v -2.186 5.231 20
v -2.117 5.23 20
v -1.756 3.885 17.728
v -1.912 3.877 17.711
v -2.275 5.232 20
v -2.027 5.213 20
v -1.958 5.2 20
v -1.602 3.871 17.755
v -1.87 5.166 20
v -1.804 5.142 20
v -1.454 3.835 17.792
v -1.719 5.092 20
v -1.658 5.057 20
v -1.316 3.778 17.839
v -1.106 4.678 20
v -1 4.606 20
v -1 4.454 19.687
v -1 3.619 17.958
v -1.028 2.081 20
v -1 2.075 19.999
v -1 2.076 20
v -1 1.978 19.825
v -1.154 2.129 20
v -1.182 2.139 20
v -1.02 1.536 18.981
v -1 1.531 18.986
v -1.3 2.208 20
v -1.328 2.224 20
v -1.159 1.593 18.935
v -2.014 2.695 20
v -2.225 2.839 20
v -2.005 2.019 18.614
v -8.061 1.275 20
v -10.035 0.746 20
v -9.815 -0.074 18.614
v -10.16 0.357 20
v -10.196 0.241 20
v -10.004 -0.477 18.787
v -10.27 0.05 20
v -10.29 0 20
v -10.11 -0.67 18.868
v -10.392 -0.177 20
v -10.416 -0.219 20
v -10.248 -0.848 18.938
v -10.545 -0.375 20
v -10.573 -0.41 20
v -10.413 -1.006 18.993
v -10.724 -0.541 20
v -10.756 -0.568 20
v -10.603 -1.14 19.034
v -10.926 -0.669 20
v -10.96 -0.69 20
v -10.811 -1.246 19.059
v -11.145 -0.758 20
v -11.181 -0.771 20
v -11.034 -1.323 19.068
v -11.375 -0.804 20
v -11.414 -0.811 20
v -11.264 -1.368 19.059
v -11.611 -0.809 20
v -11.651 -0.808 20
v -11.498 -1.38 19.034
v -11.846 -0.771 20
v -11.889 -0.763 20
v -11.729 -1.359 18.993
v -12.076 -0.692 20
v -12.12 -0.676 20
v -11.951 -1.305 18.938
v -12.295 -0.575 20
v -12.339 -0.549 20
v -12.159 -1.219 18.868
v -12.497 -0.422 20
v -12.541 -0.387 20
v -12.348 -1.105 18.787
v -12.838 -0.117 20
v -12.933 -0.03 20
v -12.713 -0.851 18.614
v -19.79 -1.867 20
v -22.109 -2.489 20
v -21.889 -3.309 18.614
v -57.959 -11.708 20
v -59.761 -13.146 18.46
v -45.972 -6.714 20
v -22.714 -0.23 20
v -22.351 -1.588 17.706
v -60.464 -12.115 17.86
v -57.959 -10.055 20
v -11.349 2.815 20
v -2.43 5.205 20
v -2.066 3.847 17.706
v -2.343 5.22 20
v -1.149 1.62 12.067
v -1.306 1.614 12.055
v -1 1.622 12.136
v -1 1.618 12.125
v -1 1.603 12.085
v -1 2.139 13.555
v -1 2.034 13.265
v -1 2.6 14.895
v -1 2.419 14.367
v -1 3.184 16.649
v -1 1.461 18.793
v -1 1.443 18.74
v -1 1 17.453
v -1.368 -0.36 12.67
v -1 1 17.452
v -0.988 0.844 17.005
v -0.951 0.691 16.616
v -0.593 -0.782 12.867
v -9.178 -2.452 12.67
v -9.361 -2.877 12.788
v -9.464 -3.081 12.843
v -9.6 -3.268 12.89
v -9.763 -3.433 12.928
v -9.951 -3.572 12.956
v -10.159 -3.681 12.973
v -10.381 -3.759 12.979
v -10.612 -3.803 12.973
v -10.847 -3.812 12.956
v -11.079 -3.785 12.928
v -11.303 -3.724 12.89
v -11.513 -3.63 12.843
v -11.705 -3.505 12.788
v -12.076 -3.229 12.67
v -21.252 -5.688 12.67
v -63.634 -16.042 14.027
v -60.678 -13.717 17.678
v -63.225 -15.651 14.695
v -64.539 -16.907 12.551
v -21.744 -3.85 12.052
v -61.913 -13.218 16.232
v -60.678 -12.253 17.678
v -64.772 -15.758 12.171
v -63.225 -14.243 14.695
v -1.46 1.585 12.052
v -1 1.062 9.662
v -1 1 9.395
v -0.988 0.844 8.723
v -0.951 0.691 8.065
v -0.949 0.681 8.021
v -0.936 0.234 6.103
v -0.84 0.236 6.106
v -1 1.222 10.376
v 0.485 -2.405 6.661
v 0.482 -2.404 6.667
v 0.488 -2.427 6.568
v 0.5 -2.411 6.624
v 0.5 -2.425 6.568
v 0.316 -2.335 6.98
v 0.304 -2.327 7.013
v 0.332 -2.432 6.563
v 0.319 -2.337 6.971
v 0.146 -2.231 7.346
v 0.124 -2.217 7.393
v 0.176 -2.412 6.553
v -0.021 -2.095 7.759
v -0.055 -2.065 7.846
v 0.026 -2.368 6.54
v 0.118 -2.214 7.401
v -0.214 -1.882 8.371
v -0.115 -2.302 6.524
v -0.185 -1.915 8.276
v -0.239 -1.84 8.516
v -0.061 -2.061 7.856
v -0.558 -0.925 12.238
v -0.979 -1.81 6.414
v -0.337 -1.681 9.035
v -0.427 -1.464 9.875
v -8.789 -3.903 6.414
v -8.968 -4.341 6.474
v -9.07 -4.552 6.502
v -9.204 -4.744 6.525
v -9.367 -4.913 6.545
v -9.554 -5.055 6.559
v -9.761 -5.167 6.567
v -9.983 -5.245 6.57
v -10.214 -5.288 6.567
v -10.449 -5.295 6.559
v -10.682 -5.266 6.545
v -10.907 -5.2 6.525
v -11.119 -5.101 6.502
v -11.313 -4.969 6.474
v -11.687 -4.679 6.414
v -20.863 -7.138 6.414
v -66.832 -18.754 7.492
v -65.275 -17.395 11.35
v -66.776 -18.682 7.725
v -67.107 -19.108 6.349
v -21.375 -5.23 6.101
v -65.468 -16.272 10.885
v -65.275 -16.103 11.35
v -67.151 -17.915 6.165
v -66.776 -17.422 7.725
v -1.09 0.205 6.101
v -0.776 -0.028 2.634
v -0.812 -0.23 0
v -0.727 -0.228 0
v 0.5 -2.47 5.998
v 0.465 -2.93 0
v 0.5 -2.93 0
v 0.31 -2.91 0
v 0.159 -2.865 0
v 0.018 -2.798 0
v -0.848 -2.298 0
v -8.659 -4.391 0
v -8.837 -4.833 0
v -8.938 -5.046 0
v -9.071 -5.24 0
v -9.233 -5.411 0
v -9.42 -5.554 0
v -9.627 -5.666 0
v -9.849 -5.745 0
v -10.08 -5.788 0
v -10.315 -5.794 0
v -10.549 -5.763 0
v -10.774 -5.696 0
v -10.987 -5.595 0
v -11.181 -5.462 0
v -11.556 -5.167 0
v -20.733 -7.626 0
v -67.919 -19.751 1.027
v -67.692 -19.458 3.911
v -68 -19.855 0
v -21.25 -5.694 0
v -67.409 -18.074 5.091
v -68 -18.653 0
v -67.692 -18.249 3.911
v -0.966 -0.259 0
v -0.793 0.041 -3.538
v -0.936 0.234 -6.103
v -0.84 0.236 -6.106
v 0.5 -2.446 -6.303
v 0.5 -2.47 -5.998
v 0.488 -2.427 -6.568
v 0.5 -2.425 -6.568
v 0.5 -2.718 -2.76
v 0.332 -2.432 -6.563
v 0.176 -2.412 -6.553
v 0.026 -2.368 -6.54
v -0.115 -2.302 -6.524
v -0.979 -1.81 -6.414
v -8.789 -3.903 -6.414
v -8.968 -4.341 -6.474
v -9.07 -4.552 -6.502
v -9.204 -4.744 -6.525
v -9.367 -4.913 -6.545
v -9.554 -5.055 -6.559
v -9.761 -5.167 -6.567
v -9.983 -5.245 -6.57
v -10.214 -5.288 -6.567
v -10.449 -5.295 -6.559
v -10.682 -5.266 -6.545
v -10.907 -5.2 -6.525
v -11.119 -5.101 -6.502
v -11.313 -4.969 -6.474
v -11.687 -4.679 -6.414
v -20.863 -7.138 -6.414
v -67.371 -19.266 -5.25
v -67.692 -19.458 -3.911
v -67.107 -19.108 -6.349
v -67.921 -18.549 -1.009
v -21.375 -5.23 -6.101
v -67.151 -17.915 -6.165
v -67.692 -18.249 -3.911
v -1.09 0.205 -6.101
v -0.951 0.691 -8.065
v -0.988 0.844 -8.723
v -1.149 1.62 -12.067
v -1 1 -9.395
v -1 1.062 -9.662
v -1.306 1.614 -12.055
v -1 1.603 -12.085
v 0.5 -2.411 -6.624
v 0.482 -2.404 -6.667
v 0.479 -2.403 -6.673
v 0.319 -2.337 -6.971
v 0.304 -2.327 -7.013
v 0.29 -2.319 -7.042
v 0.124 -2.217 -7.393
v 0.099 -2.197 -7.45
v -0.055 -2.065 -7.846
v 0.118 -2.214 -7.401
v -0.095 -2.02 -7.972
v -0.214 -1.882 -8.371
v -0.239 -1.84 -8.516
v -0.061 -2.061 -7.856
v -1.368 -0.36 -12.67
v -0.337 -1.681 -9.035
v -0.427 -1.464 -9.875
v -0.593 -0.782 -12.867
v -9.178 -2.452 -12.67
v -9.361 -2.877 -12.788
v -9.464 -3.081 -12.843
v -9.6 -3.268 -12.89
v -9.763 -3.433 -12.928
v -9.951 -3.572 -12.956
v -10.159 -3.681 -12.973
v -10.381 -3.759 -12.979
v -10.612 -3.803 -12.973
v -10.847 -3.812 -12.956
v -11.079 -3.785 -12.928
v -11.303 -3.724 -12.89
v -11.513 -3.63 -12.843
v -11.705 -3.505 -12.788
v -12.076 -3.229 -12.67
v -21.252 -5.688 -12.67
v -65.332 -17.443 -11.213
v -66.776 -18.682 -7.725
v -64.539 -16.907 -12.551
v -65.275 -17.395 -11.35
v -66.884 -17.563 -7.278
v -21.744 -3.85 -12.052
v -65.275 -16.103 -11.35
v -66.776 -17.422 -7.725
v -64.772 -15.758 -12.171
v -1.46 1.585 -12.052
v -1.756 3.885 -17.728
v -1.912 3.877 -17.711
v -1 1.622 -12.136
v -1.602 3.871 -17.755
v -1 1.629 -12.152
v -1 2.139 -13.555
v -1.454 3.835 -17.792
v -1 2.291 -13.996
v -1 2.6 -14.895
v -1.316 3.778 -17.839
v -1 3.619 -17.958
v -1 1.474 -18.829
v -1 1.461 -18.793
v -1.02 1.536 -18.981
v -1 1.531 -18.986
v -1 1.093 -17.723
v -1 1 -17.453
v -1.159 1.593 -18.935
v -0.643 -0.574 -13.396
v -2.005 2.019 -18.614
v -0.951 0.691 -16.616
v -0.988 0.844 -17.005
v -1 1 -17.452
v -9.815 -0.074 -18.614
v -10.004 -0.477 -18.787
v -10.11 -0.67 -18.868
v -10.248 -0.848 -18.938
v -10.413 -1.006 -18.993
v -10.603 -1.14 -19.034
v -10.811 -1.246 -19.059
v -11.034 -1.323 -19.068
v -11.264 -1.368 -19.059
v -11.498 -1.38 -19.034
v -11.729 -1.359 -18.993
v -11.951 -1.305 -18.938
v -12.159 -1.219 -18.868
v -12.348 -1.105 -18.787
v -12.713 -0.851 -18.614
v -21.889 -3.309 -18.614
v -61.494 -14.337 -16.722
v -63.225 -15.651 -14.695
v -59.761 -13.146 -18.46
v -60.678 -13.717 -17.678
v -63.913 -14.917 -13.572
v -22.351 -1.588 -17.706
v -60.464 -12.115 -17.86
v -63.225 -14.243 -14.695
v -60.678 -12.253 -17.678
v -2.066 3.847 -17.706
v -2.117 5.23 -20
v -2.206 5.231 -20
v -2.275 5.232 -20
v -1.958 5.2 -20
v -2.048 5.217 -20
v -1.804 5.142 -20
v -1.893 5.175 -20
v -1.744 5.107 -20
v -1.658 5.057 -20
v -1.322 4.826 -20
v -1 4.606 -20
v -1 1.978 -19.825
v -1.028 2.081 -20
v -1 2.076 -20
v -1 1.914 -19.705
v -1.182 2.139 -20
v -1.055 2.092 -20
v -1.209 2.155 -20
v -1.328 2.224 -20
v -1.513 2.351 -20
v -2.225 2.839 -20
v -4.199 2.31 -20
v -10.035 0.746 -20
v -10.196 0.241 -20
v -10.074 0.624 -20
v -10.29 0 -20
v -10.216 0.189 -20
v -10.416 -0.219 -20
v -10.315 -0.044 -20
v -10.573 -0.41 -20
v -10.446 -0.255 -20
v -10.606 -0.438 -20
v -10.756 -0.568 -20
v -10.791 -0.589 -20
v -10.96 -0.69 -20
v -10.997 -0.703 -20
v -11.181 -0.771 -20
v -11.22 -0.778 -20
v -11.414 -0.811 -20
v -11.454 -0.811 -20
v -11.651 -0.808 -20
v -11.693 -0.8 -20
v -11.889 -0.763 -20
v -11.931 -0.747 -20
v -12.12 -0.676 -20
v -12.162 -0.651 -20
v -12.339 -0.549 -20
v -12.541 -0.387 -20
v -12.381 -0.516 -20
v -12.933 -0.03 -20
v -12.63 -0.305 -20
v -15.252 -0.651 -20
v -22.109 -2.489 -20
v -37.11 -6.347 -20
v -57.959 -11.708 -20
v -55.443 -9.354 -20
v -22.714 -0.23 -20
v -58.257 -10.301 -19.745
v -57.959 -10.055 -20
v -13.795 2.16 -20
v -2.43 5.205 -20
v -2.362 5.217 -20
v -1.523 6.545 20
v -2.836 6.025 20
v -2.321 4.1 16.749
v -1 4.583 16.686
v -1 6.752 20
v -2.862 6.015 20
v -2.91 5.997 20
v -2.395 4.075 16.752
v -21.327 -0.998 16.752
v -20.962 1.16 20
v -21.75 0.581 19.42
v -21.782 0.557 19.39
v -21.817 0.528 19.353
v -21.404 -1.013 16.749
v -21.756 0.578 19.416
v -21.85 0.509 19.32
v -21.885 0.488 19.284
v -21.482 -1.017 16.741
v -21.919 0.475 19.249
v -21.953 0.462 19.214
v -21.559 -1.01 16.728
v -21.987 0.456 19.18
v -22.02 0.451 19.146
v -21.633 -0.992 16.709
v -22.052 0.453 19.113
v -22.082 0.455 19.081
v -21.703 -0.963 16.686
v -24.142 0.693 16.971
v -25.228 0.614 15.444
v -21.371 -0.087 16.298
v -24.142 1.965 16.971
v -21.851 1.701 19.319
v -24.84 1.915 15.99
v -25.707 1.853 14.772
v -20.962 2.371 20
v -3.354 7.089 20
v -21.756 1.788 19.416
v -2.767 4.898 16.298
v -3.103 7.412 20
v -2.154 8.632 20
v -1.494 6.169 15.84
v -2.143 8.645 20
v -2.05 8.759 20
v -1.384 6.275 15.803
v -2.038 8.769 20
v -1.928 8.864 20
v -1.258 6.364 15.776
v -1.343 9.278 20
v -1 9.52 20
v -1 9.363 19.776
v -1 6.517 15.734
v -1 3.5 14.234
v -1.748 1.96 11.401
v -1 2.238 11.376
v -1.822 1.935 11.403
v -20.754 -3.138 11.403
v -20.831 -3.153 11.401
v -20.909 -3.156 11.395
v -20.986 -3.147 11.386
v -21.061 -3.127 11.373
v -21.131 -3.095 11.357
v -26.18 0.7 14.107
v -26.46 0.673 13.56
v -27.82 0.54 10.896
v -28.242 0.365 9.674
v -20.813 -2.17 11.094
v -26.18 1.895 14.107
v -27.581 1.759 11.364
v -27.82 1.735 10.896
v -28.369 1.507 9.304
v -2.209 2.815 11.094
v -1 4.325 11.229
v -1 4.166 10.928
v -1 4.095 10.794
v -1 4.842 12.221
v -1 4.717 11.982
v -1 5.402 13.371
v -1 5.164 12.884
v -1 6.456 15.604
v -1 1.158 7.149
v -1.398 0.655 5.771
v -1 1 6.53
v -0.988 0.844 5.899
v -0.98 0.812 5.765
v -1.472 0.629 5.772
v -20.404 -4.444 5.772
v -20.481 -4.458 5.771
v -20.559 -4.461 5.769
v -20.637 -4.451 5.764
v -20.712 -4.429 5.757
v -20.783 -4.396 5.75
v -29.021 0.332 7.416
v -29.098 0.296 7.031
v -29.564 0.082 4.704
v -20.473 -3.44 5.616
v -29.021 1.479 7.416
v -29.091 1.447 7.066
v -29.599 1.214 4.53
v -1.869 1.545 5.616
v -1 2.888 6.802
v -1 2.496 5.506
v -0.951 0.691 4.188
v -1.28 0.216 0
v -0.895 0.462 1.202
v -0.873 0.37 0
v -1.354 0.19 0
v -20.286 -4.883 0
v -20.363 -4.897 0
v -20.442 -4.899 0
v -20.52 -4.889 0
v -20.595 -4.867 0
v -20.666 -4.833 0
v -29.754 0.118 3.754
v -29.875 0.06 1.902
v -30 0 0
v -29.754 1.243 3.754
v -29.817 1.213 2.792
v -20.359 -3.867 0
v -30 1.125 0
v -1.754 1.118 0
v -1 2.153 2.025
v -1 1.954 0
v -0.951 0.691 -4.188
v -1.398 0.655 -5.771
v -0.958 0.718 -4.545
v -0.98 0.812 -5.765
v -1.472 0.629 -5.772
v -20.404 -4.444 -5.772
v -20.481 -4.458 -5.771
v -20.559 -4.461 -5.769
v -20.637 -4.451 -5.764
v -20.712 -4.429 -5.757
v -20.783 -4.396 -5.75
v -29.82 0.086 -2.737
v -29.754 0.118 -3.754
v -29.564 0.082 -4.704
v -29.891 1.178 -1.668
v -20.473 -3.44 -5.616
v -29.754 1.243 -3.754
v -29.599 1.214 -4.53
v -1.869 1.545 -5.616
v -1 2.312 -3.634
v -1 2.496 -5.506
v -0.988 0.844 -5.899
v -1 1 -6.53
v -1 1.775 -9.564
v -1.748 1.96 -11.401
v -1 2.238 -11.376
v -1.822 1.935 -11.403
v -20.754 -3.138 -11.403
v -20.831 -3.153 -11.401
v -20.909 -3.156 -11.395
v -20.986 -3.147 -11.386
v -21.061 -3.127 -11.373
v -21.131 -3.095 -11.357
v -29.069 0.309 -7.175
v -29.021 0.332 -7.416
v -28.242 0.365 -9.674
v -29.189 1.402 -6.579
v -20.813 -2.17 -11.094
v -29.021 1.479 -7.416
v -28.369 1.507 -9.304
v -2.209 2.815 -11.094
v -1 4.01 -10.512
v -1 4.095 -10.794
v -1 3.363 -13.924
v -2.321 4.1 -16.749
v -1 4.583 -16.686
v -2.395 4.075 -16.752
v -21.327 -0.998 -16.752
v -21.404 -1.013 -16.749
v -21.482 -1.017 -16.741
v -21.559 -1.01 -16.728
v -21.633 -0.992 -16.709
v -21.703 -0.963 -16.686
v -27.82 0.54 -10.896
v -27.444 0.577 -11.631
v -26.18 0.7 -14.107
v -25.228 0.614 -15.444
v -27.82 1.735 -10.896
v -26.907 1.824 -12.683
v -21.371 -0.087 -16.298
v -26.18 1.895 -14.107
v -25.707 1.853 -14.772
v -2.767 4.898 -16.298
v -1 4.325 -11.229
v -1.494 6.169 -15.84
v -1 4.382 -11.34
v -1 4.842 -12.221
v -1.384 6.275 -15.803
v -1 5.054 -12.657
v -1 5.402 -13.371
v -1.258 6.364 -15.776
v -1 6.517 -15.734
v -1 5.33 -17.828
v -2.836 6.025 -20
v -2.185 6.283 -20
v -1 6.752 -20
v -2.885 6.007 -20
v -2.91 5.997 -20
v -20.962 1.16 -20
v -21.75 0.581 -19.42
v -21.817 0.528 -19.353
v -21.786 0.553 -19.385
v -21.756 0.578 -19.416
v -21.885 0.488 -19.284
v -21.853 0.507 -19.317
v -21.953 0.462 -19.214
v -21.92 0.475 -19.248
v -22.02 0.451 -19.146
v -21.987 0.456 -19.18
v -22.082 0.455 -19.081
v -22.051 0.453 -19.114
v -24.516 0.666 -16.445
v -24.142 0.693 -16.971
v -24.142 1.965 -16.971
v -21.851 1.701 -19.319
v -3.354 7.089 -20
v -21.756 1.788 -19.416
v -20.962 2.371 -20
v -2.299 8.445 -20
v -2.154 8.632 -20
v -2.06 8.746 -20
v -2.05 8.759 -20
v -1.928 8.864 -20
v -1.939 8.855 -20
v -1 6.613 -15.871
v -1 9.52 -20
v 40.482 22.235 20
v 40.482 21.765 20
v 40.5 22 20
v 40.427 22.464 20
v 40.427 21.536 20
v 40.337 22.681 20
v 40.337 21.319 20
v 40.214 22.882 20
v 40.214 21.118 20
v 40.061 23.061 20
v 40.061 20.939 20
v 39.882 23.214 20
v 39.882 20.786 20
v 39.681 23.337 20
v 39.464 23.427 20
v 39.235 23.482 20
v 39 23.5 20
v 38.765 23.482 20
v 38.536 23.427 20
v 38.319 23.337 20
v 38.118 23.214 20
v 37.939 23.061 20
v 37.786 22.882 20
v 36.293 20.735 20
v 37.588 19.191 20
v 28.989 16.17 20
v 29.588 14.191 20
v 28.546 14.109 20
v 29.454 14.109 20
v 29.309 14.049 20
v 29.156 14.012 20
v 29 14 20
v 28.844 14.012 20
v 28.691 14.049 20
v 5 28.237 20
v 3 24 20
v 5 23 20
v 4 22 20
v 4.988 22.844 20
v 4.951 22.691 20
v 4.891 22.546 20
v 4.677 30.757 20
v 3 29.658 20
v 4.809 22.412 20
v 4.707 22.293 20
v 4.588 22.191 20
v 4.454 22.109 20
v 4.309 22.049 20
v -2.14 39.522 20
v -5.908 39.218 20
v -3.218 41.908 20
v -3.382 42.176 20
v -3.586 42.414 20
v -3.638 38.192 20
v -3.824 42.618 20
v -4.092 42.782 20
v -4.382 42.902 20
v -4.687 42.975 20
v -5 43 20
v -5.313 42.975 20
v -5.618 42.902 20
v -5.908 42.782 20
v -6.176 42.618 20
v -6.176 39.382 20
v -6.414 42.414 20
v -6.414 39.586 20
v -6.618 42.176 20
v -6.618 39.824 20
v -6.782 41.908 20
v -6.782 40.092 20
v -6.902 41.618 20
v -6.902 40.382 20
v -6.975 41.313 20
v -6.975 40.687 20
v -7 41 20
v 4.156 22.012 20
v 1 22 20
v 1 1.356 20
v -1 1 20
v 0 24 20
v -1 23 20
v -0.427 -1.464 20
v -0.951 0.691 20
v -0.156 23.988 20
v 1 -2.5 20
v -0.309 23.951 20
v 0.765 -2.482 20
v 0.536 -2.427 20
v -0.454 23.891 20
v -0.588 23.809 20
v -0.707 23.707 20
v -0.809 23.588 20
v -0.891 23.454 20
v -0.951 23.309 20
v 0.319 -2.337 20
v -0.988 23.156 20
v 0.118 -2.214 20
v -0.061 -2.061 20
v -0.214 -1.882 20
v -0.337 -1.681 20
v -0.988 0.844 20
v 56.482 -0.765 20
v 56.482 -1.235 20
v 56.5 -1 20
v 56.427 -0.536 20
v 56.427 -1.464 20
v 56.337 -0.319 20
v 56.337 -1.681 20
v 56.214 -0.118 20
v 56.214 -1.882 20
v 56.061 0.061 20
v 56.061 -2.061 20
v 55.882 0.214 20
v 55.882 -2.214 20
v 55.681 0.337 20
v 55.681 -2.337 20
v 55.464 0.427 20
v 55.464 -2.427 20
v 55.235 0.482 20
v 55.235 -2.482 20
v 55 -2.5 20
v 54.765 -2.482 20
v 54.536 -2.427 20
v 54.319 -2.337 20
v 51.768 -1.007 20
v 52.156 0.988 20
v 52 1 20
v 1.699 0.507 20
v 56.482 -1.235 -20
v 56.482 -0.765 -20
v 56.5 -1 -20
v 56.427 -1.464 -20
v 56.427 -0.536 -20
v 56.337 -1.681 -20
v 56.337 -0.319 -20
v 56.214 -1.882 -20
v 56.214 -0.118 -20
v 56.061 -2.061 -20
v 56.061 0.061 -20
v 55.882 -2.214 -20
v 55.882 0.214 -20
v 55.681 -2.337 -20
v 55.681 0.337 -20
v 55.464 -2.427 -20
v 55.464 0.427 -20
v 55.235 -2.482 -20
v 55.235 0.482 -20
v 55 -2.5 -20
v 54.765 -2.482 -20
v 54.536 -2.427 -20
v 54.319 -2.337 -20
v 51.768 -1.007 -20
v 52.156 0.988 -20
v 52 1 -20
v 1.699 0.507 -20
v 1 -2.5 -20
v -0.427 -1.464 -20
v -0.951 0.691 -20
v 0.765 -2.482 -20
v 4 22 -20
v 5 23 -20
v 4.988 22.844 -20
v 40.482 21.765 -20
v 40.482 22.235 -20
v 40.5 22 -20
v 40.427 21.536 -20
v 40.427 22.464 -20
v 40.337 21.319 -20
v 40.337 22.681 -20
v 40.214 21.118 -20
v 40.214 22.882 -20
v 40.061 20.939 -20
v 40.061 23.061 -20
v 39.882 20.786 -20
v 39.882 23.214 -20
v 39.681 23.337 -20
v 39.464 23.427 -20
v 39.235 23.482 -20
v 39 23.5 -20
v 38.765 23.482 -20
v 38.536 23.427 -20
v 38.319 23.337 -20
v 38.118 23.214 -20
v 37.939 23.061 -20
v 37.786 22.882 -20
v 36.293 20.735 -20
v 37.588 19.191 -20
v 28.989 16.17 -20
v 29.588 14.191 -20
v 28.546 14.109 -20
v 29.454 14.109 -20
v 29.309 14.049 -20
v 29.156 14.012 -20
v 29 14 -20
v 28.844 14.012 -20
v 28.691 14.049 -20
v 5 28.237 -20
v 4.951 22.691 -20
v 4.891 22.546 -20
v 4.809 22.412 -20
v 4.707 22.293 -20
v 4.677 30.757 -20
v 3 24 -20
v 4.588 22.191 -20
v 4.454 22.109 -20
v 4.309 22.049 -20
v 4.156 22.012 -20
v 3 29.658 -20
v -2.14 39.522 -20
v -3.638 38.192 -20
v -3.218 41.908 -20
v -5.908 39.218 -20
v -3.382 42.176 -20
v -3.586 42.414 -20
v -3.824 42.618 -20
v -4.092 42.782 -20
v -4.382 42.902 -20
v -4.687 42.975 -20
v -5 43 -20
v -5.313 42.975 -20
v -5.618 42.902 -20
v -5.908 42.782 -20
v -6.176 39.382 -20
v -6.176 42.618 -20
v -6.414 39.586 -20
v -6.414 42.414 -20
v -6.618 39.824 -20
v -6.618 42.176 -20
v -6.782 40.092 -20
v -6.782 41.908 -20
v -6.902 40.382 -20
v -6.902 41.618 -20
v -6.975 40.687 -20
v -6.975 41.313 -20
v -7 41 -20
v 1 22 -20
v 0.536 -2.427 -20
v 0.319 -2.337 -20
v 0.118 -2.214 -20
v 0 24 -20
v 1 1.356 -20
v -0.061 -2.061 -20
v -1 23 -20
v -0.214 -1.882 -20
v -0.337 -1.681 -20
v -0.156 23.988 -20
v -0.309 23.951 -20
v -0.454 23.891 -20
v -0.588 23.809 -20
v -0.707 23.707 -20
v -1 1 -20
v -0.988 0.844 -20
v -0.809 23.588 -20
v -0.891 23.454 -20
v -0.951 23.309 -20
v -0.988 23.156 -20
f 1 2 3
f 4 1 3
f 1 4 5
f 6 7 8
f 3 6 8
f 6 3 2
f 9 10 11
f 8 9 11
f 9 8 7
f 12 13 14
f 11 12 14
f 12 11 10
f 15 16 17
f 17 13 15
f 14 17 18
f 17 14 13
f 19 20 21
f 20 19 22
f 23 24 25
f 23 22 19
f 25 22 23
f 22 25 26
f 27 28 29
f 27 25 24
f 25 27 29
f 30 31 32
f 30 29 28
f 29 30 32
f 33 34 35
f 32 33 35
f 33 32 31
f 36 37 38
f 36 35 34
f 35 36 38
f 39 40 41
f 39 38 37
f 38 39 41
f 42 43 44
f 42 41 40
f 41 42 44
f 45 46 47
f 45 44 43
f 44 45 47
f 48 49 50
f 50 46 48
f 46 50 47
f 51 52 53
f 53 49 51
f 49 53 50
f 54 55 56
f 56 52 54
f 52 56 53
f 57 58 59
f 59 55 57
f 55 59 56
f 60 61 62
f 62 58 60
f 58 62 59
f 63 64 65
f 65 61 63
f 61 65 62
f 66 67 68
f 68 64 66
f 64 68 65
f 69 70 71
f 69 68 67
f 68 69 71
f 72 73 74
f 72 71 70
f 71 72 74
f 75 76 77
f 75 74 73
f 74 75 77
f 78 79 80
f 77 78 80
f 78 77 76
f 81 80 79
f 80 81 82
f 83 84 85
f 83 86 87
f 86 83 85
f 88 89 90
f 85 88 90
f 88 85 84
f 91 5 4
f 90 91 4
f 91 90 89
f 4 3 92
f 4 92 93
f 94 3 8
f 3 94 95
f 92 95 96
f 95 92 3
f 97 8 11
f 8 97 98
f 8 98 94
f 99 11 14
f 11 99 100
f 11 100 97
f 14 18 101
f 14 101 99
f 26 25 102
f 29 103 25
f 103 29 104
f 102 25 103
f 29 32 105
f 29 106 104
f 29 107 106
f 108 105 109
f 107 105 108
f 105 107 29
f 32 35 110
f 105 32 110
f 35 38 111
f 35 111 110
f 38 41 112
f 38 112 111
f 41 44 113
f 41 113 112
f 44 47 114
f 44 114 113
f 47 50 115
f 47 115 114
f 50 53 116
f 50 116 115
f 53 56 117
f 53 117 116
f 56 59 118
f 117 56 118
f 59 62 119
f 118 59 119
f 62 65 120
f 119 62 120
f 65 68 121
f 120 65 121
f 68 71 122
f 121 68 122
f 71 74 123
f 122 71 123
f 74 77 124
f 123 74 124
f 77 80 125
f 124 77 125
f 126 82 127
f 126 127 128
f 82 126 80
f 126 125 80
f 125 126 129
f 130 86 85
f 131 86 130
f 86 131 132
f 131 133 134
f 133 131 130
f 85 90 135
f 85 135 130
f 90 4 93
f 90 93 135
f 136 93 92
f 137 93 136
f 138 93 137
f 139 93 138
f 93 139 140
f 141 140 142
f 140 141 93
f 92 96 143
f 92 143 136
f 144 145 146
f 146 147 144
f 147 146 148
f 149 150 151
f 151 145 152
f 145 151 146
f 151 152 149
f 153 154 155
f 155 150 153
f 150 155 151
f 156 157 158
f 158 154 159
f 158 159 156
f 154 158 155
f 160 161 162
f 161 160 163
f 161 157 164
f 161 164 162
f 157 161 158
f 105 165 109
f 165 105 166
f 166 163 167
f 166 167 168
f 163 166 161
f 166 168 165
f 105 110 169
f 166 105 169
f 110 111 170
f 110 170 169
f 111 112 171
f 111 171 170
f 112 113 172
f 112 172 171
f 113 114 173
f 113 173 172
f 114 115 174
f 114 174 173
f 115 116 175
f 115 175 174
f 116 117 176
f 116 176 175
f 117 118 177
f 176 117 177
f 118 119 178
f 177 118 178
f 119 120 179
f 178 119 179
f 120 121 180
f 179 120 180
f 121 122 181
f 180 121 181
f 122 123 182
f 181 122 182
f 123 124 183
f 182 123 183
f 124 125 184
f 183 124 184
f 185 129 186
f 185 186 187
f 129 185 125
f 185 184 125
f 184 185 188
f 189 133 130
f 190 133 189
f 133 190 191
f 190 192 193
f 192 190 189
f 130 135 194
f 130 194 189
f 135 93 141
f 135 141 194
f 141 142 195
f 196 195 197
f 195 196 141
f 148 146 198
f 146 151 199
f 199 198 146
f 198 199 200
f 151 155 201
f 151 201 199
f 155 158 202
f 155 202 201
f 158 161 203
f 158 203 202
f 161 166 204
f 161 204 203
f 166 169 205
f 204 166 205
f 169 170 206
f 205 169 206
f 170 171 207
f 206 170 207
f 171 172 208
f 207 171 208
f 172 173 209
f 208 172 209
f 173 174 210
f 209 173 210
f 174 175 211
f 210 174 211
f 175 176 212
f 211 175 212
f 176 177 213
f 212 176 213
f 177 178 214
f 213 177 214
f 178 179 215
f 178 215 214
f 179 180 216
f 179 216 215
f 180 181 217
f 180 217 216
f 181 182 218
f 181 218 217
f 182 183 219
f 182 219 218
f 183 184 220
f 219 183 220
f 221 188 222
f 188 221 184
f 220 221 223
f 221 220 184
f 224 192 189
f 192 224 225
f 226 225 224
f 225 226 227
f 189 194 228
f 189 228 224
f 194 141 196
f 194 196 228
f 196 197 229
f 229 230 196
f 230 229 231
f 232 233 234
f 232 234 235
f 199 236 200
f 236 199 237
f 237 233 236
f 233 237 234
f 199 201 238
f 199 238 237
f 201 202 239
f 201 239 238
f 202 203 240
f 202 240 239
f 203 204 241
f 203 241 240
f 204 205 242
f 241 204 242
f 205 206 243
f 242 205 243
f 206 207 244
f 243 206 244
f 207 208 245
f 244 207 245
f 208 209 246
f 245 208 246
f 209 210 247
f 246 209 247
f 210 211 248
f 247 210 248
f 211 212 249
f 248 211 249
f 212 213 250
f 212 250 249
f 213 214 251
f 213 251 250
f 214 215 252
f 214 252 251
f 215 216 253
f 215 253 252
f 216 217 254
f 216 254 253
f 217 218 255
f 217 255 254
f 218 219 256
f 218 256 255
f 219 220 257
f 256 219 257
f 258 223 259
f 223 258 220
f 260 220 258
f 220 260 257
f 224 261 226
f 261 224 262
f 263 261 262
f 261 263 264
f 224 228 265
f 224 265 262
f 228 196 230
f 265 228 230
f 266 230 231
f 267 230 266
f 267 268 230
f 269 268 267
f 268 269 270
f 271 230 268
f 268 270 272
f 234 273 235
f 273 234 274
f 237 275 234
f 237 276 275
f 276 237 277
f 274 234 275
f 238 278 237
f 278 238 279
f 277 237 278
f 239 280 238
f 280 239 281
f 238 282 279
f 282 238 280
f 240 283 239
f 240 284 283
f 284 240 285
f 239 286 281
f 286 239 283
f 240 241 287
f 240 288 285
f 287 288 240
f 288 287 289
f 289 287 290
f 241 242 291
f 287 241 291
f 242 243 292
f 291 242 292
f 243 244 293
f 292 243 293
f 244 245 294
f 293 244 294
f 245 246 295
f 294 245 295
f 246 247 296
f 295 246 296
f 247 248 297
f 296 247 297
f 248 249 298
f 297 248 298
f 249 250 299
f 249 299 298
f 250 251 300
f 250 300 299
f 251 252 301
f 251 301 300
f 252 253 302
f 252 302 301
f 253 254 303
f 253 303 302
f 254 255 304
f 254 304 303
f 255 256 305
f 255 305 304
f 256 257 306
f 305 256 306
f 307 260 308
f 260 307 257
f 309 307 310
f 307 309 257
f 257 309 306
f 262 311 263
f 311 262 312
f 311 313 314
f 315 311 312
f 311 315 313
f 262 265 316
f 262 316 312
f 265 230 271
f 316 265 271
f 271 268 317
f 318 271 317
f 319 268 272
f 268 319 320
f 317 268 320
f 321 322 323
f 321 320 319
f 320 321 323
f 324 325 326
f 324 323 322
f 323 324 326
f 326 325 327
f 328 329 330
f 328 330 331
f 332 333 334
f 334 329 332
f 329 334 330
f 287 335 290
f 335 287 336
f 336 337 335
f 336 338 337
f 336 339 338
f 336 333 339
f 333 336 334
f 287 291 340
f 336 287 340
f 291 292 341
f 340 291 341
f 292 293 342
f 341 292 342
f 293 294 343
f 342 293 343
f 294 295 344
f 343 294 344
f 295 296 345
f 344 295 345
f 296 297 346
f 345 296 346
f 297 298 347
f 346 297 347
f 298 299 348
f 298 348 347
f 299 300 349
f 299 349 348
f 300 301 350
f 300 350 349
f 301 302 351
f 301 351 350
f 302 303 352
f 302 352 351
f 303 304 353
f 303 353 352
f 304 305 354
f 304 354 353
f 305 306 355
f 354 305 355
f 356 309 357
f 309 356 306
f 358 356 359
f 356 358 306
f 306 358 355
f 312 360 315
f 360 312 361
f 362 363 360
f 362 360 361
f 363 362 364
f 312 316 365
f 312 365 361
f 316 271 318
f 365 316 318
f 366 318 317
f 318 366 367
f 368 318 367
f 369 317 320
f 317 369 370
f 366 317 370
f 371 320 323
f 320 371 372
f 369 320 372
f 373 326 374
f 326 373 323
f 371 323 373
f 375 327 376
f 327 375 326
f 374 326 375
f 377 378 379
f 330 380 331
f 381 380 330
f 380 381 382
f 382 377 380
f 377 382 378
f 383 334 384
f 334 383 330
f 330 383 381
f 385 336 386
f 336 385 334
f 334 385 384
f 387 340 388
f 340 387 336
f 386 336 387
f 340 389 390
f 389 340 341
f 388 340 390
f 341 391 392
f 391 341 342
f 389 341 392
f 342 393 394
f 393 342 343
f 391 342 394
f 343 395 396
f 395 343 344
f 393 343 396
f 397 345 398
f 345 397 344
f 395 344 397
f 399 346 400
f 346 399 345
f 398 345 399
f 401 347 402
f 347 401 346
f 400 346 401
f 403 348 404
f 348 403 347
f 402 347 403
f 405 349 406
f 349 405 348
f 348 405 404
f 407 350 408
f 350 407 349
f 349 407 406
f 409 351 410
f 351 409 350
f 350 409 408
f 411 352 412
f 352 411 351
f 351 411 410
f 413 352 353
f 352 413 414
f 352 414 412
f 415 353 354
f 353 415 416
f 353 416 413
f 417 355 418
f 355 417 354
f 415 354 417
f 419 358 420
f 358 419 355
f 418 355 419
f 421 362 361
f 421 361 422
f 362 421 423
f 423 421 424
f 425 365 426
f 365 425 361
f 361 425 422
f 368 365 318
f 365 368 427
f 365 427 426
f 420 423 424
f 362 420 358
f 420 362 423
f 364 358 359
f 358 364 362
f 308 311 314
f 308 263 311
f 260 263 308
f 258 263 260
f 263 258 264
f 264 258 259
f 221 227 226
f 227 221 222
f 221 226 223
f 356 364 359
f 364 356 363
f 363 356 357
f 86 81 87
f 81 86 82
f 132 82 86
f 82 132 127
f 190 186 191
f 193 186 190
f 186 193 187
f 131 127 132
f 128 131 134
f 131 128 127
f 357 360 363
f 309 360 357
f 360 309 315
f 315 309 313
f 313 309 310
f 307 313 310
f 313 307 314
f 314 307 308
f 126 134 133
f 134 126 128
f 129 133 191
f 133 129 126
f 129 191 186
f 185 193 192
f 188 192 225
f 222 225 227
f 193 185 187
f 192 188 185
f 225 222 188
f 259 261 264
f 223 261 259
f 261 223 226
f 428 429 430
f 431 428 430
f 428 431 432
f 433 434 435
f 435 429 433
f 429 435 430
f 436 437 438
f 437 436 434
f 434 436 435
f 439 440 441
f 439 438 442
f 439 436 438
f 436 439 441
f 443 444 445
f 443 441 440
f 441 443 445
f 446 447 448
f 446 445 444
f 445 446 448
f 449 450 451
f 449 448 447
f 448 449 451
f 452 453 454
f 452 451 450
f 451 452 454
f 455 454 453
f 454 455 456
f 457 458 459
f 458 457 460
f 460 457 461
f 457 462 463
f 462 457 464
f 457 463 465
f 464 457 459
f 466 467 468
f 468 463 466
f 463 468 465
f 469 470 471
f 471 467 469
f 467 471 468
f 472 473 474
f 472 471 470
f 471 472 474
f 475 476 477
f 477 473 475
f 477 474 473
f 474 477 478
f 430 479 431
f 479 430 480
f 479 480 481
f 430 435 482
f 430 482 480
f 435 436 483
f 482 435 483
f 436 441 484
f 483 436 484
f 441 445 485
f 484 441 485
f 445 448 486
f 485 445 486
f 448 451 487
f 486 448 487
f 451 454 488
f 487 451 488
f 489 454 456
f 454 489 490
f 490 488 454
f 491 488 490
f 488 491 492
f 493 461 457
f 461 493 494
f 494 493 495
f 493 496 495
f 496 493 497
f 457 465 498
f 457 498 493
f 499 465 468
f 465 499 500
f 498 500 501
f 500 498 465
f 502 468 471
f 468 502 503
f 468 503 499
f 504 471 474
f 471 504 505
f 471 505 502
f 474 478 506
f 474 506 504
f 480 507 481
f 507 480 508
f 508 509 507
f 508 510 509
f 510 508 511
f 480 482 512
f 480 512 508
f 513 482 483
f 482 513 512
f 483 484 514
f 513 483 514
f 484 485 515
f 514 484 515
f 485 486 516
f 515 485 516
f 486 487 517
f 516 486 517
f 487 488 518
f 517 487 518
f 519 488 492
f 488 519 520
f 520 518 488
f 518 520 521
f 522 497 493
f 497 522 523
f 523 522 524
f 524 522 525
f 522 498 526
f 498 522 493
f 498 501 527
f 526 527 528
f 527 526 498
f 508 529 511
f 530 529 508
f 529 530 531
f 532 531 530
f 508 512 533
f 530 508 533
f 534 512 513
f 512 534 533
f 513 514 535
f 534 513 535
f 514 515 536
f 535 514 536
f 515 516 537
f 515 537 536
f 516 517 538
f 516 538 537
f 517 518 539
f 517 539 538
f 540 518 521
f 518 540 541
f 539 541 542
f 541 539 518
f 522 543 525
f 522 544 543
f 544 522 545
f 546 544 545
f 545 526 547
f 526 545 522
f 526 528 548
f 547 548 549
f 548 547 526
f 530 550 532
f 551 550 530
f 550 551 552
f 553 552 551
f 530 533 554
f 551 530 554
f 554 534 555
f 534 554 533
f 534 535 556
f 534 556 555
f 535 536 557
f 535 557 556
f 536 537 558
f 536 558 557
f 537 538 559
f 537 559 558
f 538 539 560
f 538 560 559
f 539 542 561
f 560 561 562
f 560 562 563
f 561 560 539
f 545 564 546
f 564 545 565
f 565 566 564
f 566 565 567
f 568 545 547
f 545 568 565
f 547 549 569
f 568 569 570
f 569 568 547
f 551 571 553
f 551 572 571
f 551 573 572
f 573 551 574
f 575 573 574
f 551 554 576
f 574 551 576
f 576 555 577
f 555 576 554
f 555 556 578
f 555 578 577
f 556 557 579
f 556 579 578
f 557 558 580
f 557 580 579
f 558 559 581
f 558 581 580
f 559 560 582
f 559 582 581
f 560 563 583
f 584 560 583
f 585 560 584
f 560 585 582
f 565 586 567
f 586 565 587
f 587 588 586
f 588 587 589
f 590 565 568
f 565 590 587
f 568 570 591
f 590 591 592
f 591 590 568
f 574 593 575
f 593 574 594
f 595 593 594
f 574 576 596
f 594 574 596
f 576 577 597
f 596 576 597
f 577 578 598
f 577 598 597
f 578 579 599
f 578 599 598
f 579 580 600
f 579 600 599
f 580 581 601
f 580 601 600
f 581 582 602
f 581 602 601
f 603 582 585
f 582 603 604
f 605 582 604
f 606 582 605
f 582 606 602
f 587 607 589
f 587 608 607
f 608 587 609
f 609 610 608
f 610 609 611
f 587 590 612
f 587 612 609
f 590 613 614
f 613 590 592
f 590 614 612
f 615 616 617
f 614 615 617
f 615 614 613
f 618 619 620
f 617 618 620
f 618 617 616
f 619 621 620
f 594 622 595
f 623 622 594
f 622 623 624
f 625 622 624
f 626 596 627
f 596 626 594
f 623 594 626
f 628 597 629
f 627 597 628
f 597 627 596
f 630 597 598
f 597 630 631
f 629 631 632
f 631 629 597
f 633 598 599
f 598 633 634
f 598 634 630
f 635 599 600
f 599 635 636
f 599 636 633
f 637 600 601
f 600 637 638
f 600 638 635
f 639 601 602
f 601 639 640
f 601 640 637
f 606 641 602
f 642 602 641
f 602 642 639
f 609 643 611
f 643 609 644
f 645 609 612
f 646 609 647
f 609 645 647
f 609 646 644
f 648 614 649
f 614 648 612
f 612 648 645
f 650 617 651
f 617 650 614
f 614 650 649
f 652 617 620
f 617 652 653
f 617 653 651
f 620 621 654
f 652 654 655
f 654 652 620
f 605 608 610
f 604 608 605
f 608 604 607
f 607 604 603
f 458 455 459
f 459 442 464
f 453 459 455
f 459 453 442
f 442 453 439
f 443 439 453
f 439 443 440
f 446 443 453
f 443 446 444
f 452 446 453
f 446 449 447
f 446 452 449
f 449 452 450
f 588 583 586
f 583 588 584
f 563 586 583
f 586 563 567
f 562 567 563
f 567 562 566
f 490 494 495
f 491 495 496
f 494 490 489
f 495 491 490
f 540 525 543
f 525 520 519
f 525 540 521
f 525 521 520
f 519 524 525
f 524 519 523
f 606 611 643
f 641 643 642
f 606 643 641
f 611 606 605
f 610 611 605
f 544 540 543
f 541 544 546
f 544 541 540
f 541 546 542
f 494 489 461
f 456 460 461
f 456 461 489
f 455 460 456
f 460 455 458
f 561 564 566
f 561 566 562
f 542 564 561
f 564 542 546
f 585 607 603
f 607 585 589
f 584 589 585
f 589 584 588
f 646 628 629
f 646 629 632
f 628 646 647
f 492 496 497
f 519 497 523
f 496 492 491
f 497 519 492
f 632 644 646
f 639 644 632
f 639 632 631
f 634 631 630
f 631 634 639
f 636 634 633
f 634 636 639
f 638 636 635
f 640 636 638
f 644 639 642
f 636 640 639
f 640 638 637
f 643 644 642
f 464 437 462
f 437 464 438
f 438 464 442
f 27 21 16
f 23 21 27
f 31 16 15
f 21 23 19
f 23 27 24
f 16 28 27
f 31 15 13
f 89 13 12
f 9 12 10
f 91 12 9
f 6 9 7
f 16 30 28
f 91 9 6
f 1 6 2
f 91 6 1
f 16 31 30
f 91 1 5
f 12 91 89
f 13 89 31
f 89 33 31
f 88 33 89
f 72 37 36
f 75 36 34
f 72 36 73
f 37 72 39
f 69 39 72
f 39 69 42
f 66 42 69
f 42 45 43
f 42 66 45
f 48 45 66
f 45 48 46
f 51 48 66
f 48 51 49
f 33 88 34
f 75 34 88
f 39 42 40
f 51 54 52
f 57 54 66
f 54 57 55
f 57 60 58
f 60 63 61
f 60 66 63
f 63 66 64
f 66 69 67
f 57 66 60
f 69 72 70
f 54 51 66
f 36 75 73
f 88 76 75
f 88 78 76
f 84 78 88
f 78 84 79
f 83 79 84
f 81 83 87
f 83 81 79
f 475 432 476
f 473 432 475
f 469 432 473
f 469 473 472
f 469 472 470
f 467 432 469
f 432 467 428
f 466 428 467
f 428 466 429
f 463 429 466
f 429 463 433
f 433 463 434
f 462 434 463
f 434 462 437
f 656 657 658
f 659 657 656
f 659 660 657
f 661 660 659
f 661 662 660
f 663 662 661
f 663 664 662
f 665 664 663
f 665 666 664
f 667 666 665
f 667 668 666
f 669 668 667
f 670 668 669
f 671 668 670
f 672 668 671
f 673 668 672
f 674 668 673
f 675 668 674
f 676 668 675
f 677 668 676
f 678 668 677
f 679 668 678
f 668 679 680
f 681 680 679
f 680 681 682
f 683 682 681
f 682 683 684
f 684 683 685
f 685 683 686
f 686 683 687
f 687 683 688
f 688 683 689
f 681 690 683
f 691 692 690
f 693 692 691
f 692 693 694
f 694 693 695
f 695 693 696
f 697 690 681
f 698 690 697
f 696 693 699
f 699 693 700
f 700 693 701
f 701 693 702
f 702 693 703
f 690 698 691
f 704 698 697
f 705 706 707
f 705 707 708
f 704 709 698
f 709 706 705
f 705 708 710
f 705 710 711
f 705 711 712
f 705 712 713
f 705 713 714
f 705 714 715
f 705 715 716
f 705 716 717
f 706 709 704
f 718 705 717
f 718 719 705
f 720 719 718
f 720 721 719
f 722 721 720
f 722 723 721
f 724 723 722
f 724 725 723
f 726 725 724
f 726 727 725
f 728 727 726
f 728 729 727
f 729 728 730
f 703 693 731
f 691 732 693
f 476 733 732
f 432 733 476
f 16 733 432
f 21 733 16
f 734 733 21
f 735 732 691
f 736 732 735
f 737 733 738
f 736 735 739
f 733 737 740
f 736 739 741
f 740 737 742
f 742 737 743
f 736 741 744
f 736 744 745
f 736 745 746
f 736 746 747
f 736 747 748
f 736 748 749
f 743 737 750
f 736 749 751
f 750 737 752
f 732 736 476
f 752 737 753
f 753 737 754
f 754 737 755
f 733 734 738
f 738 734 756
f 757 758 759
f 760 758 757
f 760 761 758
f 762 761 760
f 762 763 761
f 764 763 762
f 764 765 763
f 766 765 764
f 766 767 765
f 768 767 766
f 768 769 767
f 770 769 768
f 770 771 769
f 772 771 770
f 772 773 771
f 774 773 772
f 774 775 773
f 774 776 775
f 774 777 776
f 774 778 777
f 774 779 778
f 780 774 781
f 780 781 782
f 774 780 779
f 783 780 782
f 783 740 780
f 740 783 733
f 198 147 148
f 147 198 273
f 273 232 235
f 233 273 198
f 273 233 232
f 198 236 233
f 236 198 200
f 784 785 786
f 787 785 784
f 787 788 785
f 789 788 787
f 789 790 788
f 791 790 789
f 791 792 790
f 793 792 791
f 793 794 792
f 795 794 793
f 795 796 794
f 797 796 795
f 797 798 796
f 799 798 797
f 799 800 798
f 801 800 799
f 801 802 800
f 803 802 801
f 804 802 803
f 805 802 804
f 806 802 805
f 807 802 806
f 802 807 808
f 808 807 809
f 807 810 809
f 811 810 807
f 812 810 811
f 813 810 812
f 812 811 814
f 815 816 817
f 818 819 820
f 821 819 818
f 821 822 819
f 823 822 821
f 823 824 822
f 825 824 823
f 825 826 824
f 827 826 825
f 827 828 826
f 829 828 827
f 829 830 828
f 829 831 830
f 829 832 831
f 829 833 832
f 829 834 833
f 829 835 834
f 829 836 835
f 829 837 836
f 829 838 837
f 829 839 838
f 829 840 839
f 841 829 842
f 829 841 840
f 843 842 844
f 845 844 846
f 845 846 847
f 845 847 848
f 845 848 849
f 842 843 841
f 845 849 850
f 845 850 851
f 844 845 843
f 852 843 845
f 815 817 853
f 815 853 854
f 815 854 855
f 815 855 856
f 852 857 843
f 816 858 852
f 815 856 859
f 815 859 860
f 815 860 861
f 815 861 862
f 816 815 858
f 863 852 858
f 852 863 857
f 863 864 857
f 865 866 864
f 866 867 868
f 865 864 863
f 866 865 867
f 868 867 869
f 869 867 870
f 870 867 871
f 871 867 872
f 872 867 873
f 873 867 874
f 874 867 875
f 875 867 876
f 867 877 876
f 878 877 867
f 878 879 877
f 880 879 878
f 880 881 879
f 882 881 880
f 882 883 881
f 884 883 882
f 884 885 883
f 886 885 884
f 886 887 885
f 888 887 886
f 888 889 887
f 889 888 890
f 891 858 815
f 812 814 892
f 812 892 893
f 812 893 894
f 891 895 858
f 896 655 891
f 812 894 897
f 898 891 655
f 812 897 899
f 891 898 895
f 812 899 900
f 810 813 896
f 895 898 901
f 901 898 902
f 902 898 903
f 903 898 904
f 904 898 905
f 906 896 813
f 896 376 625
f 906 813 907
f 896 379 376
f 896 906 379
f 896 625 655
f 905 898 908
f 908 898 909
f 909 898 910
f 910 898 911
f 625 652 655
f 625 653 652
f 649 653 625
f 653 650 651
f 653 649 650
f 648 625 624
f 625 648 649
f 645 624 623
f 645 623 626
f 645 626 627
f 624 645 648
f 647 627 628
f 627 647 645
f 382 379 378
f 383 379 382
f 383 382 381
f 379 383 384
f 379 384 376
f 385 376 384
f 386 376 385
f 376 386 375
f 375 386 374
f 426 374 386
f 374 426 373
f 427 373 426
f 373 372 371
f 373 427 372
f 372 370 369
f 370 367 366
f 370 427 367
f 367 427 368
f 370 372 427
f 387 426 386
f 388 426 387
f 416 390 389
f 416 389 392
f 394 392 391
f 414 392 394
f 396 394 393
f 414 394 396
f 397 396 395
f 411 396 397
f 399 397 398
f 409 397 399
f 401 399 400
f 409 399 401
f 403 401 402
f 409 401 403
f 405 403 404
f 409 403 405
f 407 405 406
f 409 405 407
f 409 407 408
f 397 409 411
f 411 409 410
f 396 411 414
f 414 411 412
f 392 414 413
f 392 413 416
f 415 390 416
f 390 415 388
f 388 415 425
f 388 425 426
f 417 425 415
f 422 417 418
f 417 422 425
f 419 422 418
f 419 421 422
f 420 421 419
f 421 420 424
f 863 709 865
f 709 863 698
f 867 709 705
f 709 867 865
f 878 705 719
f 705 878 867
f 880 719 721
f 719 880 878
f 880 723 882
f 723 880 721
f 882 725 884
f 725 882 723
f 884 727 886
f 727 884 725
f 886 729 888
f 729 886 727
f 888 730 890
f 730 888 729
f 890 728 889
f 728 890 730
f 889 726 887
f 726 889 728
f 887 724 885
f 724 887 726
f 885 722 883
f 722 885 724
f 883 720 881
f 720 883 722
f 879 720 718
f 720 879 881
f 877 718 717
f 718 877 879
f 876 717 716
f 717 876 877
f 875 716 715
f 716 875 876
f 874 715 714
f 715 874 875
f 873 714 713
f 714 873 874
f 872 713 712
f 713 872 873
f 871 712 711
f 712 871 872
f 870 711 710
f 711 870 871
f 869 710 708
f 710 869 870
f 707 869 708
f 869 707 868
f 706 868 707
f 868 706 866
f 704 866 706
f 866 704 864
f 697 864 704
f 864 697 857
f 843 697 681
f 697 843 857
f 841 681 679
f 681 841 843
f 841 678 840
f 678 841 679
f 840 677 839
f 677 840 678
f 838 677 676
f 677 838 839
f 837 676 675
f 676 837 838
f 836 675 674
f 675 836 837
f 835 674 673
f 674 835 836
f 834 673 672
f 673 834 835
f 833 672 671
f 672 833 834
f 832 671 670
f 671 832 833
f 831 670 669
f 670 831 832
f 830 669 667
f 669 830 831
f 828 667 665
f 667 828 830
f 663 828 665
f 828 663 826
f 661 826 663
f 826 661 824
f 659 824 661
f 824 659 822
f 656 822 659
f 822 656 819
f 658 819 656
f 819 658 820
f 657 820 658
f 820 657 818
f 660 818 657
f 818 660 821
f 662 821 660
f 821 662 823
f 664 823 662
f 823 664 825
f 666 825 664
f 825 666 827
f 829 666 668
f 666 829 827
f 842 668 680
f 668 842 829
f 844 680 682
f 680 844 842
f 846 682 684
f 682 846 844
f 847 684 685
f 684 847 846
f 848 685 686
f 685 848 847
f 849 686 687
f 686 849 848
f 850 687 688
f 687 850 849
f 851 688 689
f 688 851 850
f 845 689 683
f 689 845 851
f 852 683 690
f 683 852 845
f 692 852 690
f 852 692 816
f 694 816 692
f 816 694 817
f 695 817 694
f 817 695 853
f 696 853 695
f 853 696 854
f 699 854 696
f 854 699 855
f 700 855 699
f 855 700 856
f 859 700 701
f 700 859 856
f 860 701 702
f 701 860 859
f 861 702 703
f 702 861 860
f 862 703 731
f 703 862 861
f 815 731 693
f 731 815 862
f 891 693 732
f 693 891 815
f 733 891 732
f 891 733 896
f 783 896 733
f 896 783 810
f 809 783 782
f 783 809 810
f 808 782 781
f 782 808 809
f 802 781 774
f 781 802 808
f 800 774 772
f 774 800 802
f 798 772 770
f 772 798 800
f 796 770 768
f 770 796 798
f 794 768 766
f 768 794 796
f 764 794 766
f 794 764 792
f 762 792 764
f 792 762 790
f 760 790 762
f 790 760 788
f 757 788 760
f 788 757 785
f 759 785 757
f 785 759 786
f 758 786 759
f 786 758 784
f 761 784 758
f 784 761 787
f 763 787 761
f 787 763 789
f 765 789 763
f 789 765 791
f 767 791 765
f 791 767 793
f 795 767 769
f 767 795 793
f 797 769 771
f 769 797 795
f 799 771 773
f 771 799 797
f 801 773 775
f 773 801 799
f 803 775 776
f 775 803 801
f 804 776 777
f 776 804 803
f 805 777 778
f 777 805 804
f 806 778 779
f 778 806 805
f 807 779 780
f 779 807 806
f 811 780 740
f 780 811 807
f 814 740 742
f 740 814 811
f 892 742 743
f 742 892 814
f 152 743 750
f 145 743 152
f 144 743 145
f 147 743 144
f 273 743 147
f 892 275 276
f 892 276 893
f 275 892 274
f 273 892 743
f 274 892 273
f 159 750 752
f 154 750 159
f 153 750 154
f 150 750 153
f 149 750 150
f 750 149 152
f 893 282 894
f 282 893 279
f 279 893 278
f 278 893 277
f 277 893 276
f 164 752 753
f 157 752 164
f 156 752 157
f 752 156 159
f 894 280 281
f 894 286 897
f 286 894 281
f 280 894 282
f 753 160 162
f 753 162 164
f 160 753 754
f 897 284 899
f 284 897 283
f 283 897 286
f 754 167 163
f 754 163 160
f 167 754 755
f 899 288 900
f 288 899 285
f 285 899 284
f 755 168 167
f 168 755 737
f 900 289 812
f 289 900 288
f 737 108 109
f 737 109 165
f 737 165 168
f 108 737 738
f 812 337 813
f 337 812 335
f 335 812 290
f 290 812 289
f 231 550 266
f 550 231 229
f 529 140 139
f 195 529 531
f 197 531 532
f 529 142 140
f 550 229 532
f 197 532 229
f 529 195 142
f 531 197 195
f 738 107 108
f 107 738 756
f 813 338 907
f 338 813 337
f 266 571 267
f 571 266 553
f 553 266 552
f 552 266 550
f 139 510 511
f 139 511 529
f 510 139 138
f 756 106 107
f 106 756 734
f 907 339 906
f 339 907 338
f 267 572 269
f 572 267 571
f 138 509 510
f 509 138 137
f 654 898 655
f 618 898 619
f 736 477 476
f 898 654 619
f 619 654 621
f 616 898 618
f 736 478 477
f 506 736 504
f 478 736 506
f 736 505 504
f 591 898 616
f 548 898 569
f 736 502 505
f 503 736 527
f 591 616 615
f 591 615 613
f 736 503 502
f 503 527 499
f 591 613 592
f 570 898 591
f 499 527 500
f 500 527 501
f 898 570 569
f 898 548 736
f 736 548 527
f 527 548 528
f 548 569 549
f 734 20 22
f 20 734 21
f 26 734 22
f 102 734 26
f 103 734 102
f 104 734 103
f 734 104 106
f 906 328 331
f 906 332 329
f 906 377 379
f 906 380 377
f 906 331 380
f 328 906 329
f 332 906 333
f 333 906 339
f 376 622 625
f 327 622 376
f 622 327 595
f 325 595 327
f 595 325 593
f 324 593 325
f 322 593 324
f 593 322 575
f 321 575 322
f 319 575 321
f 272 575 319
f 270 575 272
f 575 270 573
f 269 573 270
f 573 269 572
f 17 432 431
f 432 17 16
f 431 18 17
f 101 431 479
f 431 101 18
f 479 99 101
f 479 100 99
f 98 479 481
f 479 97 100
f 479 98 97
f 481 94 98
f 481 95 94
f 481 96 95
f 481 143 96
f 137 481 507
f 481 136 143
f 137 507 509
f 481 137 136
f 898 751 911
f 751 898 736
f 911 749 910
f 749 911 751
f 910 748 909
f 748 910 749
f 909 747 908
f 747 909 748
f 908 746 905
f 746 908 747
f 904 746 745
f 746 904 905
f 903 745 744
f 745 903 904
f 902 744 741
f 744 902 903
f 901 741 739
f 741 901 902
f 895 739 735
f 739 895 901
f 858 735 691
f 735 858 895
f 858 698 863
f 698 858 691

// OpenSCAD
$fn=40;
w=1;
profile=[[-55,-1,w*1.5],[-52,0,w],[-1,-1,w*1.5],[0,1,w],


[0,2+1+20,w], [-4,2+1+20,w],

[-4,2+2+26,w],
[3,2+2+35,w],
[5,2+2+37,w*2],
[3,2+2+35,w],
[-4,2+2+26,w],

[-29,15,w],[-37,20,w],[-39,22,w*1.5],];

  rotate([0,-90,0])union(){
rotate([0,-90,0])linear_extrude(40,center=true, convexity=50) polyline(profile);

intersection(){
 translate([0,5,49.5])cube([40,100,100],center=true);


 union(){
intersection(){
    
   rotate([15,0,0])translate([0,39,0])
    
    
 rotate_extrude() {
    iclip1=[ [40.7,-10.5,w],[41,0,w],[40,1,w],[40,10,w],[40.5,11,w*1.5],[40,12,w],[40,22,w],[40,80,w*0.5]];
    polyline(iclip1);
    
    }


  hull(){
    scale([1,2])translate([0,0,43]) rotate([90,0,0])cylinder(50,25,25,center=true);
   scale([1,2])translate([0,0,3]) rotate([90,0,0])cylinder(50,25,25,center=true);
}
} 

//lower lip
translate([0,-1]) intersection(){
    
   rotate([15,0,0])translate([0,38+0.4,0]) 
    

 rotate_extrude() {
    iclip=[ [32.7,-10.5,w],[35.7,-1,w],[36.4,1,w*0.5],[36.4,20.6,w*0.5],[26,32,w*0.5]];
    polyline(iclip);
    
    }

 scale([1.2,3])translate([0,0,10]) rotate([90,0,0])cylinder(50,20,20,center=true);

                        } 

}
}}
module polyline(a){
    
    for (i=[0:len(a)-2])
        
    hull() {
    translate([a[i].x,a[i].y]) circle (a[i].z  );
    translate([a[i+1 ].x ,a[i+1].y])circle(a[i+1].z );
    
    }
    }
